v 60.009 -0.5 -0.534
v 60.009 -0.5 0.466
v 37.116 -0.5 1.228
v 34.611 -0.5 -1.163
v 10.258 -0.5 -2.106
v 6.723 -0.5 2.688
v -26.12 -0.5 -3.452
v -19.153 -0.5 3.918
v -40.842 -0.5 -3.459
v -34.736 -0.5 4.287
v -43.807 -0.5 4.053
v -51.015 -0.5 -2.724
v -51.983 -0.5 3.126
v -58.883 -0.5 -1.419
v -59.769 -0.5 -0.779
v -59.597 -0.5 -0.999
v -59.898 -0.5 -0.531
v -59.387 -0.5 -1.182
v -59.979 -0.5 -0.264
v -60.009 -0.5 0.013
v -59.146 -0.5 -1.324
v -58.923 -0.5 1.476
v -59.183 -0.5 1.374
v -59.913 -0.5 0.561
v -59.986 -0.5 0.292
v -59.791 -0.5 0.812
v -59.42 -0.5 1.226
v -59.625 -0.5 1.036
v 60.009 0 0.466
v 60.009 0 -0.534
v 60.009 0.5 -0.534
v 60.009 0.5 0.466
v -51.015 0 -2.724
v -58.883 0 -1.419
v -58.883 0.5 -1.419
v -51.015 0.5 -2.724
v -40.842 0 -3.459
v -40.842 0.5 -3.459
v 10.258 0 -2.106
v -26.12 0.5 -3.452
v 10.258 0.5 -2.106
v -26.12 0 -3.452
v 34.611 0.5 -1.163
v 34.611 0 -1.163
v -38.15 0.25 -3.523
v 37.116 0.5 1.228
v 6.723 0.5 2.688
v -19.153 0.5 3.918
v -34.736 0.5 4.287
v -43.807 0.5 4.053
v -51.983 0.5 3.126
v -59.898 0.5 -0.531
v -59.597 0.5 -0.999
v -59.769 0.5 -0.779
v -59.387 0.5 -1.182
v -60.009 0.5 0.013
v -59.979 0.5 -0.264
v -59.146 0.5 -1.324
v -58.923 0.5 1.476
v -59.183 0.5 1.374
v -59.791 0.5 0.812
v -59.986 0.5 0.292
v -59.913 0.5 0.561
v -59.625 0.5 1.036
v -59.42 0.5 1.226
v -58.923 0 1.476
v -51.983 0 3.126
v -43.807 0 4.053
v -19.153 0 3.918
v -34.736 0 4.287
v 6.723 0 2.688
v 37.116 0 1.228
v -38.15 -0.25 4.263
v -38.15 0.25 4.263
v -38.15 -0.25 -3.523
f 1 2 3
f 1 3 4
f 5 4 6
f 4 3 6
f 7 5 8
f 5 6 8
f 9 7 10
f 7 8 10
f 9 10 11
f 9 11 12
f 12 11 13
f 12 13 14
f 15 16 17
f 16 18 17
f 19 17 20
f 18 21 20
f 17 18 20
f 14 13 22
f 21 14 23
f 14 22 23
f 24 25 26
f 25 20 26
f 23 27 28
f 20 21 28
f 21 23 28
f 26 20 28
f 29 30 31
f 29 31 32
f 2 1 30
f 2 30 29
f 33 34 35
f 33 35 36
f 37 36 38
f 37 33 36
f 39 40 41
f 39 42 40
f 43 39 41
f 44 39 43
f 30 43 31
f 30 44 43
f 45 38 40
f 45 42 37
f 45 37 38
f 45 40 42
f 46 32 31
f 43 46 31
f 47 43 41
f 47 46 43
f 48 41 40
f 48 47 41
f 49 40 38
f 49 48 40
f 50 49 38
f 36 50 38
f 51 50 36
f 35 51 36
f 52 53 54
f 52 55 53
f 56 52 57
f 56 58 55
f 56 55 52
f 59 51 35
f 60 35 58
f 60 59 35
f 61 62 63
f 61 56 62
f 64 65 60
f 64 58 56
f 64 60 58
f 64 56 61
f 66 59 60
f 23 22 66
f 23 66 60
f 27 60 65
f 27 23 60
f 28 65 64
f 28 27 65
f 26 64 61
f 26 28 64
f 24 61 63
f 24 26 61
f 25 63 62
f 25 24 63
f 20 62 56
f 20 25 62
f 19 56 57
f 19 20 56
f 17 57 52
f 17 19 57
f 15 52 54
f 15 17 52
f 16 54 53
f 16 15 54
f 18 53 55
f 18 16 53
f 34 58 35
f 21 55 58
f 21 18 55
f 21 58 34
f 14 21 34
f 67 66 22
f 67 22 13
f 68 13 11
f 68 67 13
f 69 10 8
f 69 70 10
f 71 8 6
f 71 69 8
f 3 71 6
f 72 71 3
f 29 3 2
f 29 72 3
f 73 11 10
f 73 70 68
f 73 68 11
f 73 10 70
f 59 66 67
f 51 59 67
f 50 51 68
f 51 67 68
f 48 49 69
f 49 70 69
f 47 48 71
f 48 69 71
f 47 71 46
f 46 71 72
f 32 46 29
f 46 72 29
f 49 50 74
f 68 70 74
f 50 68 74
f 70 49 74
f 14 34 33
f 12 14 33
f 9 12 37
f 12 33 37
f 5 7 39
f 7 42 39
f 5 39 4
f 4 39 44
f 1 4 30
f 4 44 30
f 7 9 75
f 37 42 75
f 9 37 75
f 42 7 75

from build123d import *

# Parameters (mm, degrees)
F0_R     = 2.2
F1_DEPTH = 0.5


# Not quite as in the source:
# - a feature names something its author has since deleted; it is built from what else it names


with BuildPart() as f1:
    # F0 (on Front) → F1 (new body, symmetric)
    with BuildSketch(Plane.XZ):
        with BuildLine():
            add(Edge.make_bspline(
                [(-58.9228828544, 1.4755374035), (-53.1031861901, 3.1954683363), (-35.6327797164, 6.0866905267), (21.0318658501, 1.3725945028), (60.0087855716, 0.4661711108)],
                knots=[0, 0, 0, 0, 0.3159620499, 1, 1, 1, 1], degree=3))
            ThreePointArc((-58.9228828544, 1.4755374035), (-60.0086458958, 0.0133592085), (-58.8833838701, -1.4186435253))
            add(Edge.make_bspline(
                [(-58.8833838701, -1.4186435253), (-53.4330829978, -2.5445383508), (-35.3326671897, -5.1505314866), (21.6348022223, -1.0668247705), (60.0087855716, -0.5338288892)],
                knots=[0, 0, 0, 0, 0.3153766332, 1, 1, 1, 1], degree=3))
            Line((60.0087855716, -0.5338288892), (60.0087855716, -0.0338288892))
            Line((60.0087855716, -0.0338288892), (60.0087855716, 0.4661711108))
        make_face()
        with BuildLine():
            add(Edge.make_bspline(
                [(-38.2616780698, 3.6168415099), (-37.3862738566, 3.620107016), (-36.5051030136, 3.6204740501), (-35.618541931, 3.6180910206)],
                knots=[0, 0, 0, 0, 2.8040999397, 2.8040999397, 2.8040999397, 2.8040999397], degree=3))
            add(Edge.make_bspline(
                [(-35.618541931, 3.6180910206), (-28.2361493541, 3.598247538), (-20.4800034879, 3.3877176683), (-12.5674262287, 3.0721900892)],
                knots=[2.8040999397, 2.8040999397, 2.8040999397, 2.8040999397, 26.1538352096, 26.1538352096, 26.1538352096, 26.1538352096], degree=3))
            add(Edge.make_bspline(
                [(-12.5674262287, 3.0721900892), (-12.2191674657, 3.0583026741), (-11.8706056681, 3.0442118605), (-11.5217593652, 3.0299249541)],
                knots=[26.1538352096, 26.1538352096, 26.1538352096, 26.1538352096, 27.1815344858, 27.1815344858, 27.1815344858, 27.1815344858], degree=3))
            add(Edge.make_bspline(
                [(-11.5217593652, 3.0299249541), (-4.8786493859, 2.7578581748), (1.8676333595, 2.4146805186), (8.5891307931, 2.0508450631)],
                knots=[27.1815344858, 27.1815344858, 27.1815344858, 27.1815344858, 46.7520996913, 46.7520996913, 46.7520996913, 46.7520996913], degree=3))
            add(Edge.make_bspline(
                [(8.5891307931, 2.0508450631), (8.9659043148, 2.0304502675), (9.3425999571, 2.0099905618), (9.7191951821, 1.9894748324)],
                knots=[46.7520996913, 46.7520996913, 46.7520996913, 46.7520996913, 47.8491276748, 47.8491276748, 47.8491276748, 47.8491276748], degree=3))
            add(Edge.make_bspline(
                [(9.7191951821, 1.9894748324), (22.9972566346, 1.2661275955), (36.1504854864, 0.4731351449), (48.1910333037, 0)],
                knots=[47.8491276748, 47.8491276748, 47.8491276748, 47.8491276748, 86.5283355113, 86.5283355113, 86.5283355113, 86.5283355113], degree=3))
            add(Edge.make_bspline(
                [(9.7191951821, -1.4306571949), (23.0872151546, -0.8738704636), (36.291554297, -0.3020974887), (48.1910333037, 0)],
                knots=[47.589168745, 47.589168745, 47.589168745, 47.589168745, 86.3670691529, 86.3670691529, 86.3670691529, 86.3670691529], degree=3))
            add(Edge.make_bspline(
                [(8.5891307931, -1.4776679077), (8.9659317989, -1.4620138036), (9.3426284313, -1.4463414451), (9.7191951821, -1.4306571949)],
                knots=[46.4968253771, 46.4968253771, 46.4968253771, 46.4968253771, 47.589168745, 47.589168745, 47.589168745, 47.589168745], degree=3))
            add(Edge.make_bspline(
                [(-8.0119146338, -2.1358759001), (-2.5096790564, -1.9338850607), (3.0509994649, -1.7077481956), (8.5891307931, -1.4776679077)],
                knots=[30.4418230465, 30.4418230465, 30.4418230465, 30.4418230465, 46.4968253771, 46.4968253771, 46.4968253771, 46.4968253771], degree=3))
            add(Edge.make_bspline(
                [(-9.1685029524, -2.1780045759), (-8.7832794964, -2.1640850551), (-8.3977407486, -2.1500398412), (-8.0119146338, -2.1358759001)],
                knots=[29.3160189827, 29.3160189827, 29.3160189827, 29.3160189827, 30.4418230465, 30.4418230465, 30.4418230465, 30.4418230465], degree=3))
            add(Edge.make_bspline(
                [(-16.1278416778, -2.4155654967), (-13.8237679533, -2.3420223971), (-11.5019196333, -2.262319385), (-9.1685029524, -2.1780045759)],
                knots=[22.4966783089, 22.4966783089, 22.4966783089, 22.4966783089, 29.3160189827, 29.3160189827, 29.3160189827, 29.3160189827], degree=3))
            add(Edge.make_bspline(
                [(-17.6034438118, -2.4618844422), (-17.1124296707, -2.4467365601), (-16.620542064, -2.4312918657), (-16.1278416778, -2.4155654967)],
                knots=[21.0384386058, 21.0384386058, 21.0384386058, 21.0384386058, 22.4966783089, 22.4966783089, 22.4966783089, 22.4966783089], degree=3))
            add(Edge.make_bspline(
                [(-35.618541931, -2.8627375282), (-29.832875954, -2.7963595375), (-23.7874330759, -2.6526617177), (-17.6034438118, -2.4618844422)],
                knots=[2.6729010132, 2.6729010132, 2.6729010132, 2.6729010132, 21.0384386058, 21.0384386058, 21.0384386058, 21.0384386058], degree=3))
            add(Edge.make_bspline(
                [(-38.1277799606, -2.8867127839), (-37.2971189192, -2.8804209375), (-36.4605816684, -2.8723981111), (-35.618541931, -2.8627375282)],
                knots=[0, 0, 0, 0, 2.6729010132, 2.6729010132, 2.6729010132, 2.6729010132], degree=3))
            add(Edge.make_bspline(
                [(-41.2343927197, -2.813945704), (-40.1954922608, -2.8458899458), (-39.1588154774, -2.8693293605), (-38.1277799606, -2.8867127839)],
                knots=[17.7850046696, 17.7850046696, 17.7850046696, 17.7850046696, 20.8486920648, 20.8486920648, 20.8486920648, 20.8486920648], degree=3))
            add(Edge.make_bspline(
                [(-58.8833838701, -0.9187526302), (-53.3711660516, -2.1564612924), (-47.2653113899, -2.6285062592), (-41.2343927197, -2.813945704)],
                knots=[0, 0, 0, 0, 17.7850046696, 17.7850046696, 17.7850046696, 17.7850046696], degree=3))
            ThreePointArc((-58.8833838701, -0.9187526302), (-59.3690674128, 0.0570033976), (-58.9228828544, 1.0514417663))
            add(Edge.make_bspline(
                [(-58.9228828544, 1.0514417663), (-53.1244599749, 2.7082601042), (-46.8471278917, 3.3047021461), (-41.2402659449, 3.5280295404)],
                knots=[0, 0, 0, 0, 17.6226858026, 17.6226858026, 17.6226858026, 17.6226858026], degree=3))
            add(Edge.make_bspline(
                [(-41.2402659449, 3.5280295404), (-40.2230472035, 3.5685464665), (-39.2278967387, 3.5967824619), (-38.2616780698, 3.6168415099)],
                knots=[17.6226858026, 17.6226858026, 17.6226858026, 17.6226858026, 20.8198621272, 20.8198621272, 20.8198621272, 20.8198621272], degree=3))
        make_face(mode=Mode.SUBTRACT)
        with BuildLine():
            add(Edge.make_bspline(
                [(-35.618541931, 3.6180910206), (-28.2361493541, 3.598247538), (-20.4800034879, 3.3877176683), (-12.5674262287, 3.0721900892)],
                knots=[2.8040999397, 2.8040999397, 2.8040999397, 2.8040999397, 26.1538352096, 26.1538352096, 26.1538352096, 26.1538352096], degree=3))
            Line((-35.618541931, 3.6180910206), (-35.618541931, -2.8627375282))
            add(Edge.make_bspline(
                [(-35.618541931, -2.8627375282), (-29.832875954, -2.7963595375), (-23.7874330759, -2.6526617177), (-17.6034438118, -2.4618844422)],
                knots=[2.6729010132, 2.6729010132, 2.6729010132, 2.6729010132, 21.0384386058, 21.0384386058, 21.0384386058, 21.0384386058], degree=3))
            Line((-17.6034438118, -2.4618844422), (-12.5674262287, 3.0721900892))
        make_face()
        with BuildLine():
            Line((-41.2343927197, -2.813945704), (-41.2402659449, 3.5280295404))
            add(Edge.make_bspline(
                [(-58.9228828544, 1.0514417663), (-53.1244599749, 2.7082601042), (-46.8471278917, 3.3047021461), (-41.2402659449, 3.5280295404)],
                knots=[0, 0, 0, 0, 17.6226858026, 17.6226858026, 17.6226858026, 17.6226858026], degree=3))
            ThreePointArc((-58.9228828544, 1.0514417663), (-59.3690674128, 0.0570033976), (-58.8833838701, -0.9187526302))
            add(Edge.make_bspline(
                [(-58.8833838701, -0.9187526302), (-53.3711660516, -2.1564612924), (-47.2653113899, -2.6285062592), (-41.2343927197, -2.813945704)],
                knots=[0, 0, 0, 0, 17.7850046696, 17.7850046696, 17.7850046696, 17.7850046696], degree=3))
        make_face()
        with BuildLine():
            add(Edge.make_bspline(
                [(-11.5217593652, 3.0299249541), (-4.8786493859, 2.7578581748), (1.8676333595, 2.4146805186), (8.5891307931, 2.0508450631)],
                knots=[27.1815344858, 27.1815344858, 27.1815344858, 27.1815344858, 46.7520996913, 46.7520996913, 46.7520996913, 46.7520996913], degree=3))
            Line((-11.5217593652, 3.0299249541), (-8.0119146338, -2.1358759001))
            add(Edge.make_bspline(
                [(-8.0119146338, -2.1358759001), (-2.5096790564, -1.9338850607), (3.0509994649, -1.7077481956), (8.5891307931, -1.4776679077)],
                knots=[30.4418230465, 30.4418230465, 30.4418230465, 30.4418230465, 46.4968253771, 46.4968253771, 46.4968253771, 46.4968253771], degree=3))
            Line((8.5891307931, -1.4776679077), (8.5891307931, 2.0508450631))
        make_face()
        with BuildLine():
            add(Edge.make_bspline(
                [(9.7191951821, 1.9894748324), (22.9972566346, 1.2661275955), (36.1504854864, 0.4731351449), (48.1910333037, 0)],
                knots=[47.8491276748, 47.8491276748, 47.8491276748, 47.8491276748, 86.5283355113, 86.5283355113, 86.5283355113, 86.5283355113], degree=3))
            Line((9.7191951821, 1.9894748324), (9.7191951821, -1.4306571949))
            add(Edge.make_bspline(
                [(9.7191951821, -1.4306571949), (23.0872151546, -0.8738704636), (36.291554297, -0.3020974887), (48.1910333037, 0)],
                knots=[47.589168745, 47.589168745, 47.589168745, 47.589168745, 86.3670691529, 86.3670691529, 86.3670691529, 86.3670691529], degree=3))
        make_face()
        with BuildLine():
            Line((-35.618541931, -2.8627375282), (-35.618541931, 3.6180910206))
            add(Edge.make_bspline(
                [(-38.2616780698, 3.6168415099), (-37.3862738566, 3.620107016), (-36.5051030136, 3.6204740501), (-35.618541931, 3.6180910206)],
                knots=[0, 0, 0, 0, 2.8040999397, 2.8040999397, 2.8040999397, 2.8040999397], degree=3))
            add(Edge.make_bspline(
                [(-41.2402659449, 3.5280295404), (-40.2230472035, 3.5685464665), (-39.2278967387, 3.5967824619), (-38.2616780698, 3.6168415099)],
                knots=[17.6226858026, 17.6226858026, 17.6226858026, 17.6226858026, 20.8198621272, 20.8198621272, 20.8198621272, 20.8198621272], degree=3))
            Line((-41.2402659449, 3.5280295404), (-41.2343927197, -2.813945704))
            add(Edge.make_bspline(
                [(-41.2343927197, -2.813945704), (-40.1954922608, -2.8458899458), (-39.1588154774, -2.8693293605), (-38.1277799606, -2.8867127839)],
                knots=[17.7850046696, 17.7850046696, 17.7850046696, 17.7850046696, 20.8486920648, 20.8486920648, 20.8486920648, 20.8486920648], degree=3))
            add(Edge.make_bspline(
                [(-38.1277799606, -2.8867127839), (-37.2971189192, -2.8804209375), (-36.4605816684, -2.8723981111), (-35.618541931, -2.8627375282)],
                knots=[0, 0, 0, 0, 2.6729010132, 2.6729010132, 2.6729010132, 2.6729010132], degree=3))
        make_face()
        with Locations((-38.368541931, 0.4547677818)):
            Circle(F0_R, mode=Mode.SUBTRACT)
        with Locations((-38.368541931, 0.4547677818)):
            Circle(F0_R)
        with BuildLine():
            Line((-12.0510029943, 2.0644683304), (-16.1278416778, -2.4155654967))
            add(Edge.make_bspline(
                [(-16.1278416778, -2.4155654967), (-13.8237679533, -2.3420223971), (-11.5019196333, -2.262319385), (-9.1685029524, -2.1780045759)],
                knots=[22.4966783089, 22.4966783089, 22.4966783089, 22.4966783089, 29.3160189827, 29.3160189827, 29.3160189827, 29.3160189827], degree=3))
            Line((-9.1685029524, -2.1780045759), (-12.0510029943, 2.0644683304))
        make_face()
        with BuildLine():
            add(Edge.make_bspline(
                [(-12.5674262287, 3.0721900892), (-12.2191674657, 3.0583026741), (-11.8706056681, 3.0442118605), (-11.5217593652, 3.0299249541)],
                knots=[26.1538352096, 26.1538352096, 26.1538352096, 26.1538352096, 27.1815344858, 27.1815344858, 27.1815344858, 27.1815344858], degree=3))
            Line((-12.5674262287, 3.0721900892), (-17.6034438118, -2.4618844422))
            add(Edge.make_bspline(
                [(-17.6034438118, -2.4618844422), (-17.1124296707, -2.4467365601), (-16.620542064, -2.4312918657), (-16.1278416778, -2.4155654967)],
                knots=[21.0384386058, 21.0384386058, 21.0384386058, 21.0384386058, 22.4966783089, 22.4966783089, 22.4966783089, 22.4966783089], degree=3))
            Line((-16.1278416778, -2.4155654967), (-12.0510029943, 2.0644683304))
            Line((-12.0510029943, 2.0644683304), (-9.1685029524, -2.1780045759))
            add(Edge.make_bspline(
                [(-9.1685029524, -2.1780045759), (-8.7832794964, -2.1640850551), (-8.3977407486, -2.1500398412), (-8.0119146338, -2.1358759001)],
                knots=[29.3160189827, 29.3160189827, 29.3160189827, 29.3160189827, 30.4418230465, 30.4418230465, 30.4418230465, 30.4418230465], degree=3))
            Line((-8.0119146338, -2.1358759001), (-11.5217593652, 3.0299249541))
        make_face()
        with BuildLine():
            add(Edge.make_bspline(
                [(8.5891307931, 2.0508450631), (8.9659043148, 2.0304502675), (9.3425999571, 2.0099905618), (9.7191951821, 1.9894748324)],
                knots=[46.7520996913, 46.7520996913, 46.7520996913, 46.7520996913, 47.8491276748, 47.8491276748, 47.8491276748, 47.8491276748], degree=3))
            Line((8.5891307931, 2.0508450631), (8.5891307931, -1.4776679077))
            add(Edge.make_bspline(
                [(8.5891307931, -1.4776679077), (8.9659317989, -1.4620138036), (9.3426284313, -1.4463414451), (9.7191951821, -1.4306571949)],
                knots=[46.4968253771, 46.4968253771, 46.4968253771, 46.4968253771, 47.589168745, 47.589168745, 47.589168745, 47.589168745], degree=3))
            Line((9.7191951821, -1.4306571949), (9.7191951821, 1.9894748324))
        make_face()
    extrude(amount=F1_DEPTH, both=True)


solid = f1.part
